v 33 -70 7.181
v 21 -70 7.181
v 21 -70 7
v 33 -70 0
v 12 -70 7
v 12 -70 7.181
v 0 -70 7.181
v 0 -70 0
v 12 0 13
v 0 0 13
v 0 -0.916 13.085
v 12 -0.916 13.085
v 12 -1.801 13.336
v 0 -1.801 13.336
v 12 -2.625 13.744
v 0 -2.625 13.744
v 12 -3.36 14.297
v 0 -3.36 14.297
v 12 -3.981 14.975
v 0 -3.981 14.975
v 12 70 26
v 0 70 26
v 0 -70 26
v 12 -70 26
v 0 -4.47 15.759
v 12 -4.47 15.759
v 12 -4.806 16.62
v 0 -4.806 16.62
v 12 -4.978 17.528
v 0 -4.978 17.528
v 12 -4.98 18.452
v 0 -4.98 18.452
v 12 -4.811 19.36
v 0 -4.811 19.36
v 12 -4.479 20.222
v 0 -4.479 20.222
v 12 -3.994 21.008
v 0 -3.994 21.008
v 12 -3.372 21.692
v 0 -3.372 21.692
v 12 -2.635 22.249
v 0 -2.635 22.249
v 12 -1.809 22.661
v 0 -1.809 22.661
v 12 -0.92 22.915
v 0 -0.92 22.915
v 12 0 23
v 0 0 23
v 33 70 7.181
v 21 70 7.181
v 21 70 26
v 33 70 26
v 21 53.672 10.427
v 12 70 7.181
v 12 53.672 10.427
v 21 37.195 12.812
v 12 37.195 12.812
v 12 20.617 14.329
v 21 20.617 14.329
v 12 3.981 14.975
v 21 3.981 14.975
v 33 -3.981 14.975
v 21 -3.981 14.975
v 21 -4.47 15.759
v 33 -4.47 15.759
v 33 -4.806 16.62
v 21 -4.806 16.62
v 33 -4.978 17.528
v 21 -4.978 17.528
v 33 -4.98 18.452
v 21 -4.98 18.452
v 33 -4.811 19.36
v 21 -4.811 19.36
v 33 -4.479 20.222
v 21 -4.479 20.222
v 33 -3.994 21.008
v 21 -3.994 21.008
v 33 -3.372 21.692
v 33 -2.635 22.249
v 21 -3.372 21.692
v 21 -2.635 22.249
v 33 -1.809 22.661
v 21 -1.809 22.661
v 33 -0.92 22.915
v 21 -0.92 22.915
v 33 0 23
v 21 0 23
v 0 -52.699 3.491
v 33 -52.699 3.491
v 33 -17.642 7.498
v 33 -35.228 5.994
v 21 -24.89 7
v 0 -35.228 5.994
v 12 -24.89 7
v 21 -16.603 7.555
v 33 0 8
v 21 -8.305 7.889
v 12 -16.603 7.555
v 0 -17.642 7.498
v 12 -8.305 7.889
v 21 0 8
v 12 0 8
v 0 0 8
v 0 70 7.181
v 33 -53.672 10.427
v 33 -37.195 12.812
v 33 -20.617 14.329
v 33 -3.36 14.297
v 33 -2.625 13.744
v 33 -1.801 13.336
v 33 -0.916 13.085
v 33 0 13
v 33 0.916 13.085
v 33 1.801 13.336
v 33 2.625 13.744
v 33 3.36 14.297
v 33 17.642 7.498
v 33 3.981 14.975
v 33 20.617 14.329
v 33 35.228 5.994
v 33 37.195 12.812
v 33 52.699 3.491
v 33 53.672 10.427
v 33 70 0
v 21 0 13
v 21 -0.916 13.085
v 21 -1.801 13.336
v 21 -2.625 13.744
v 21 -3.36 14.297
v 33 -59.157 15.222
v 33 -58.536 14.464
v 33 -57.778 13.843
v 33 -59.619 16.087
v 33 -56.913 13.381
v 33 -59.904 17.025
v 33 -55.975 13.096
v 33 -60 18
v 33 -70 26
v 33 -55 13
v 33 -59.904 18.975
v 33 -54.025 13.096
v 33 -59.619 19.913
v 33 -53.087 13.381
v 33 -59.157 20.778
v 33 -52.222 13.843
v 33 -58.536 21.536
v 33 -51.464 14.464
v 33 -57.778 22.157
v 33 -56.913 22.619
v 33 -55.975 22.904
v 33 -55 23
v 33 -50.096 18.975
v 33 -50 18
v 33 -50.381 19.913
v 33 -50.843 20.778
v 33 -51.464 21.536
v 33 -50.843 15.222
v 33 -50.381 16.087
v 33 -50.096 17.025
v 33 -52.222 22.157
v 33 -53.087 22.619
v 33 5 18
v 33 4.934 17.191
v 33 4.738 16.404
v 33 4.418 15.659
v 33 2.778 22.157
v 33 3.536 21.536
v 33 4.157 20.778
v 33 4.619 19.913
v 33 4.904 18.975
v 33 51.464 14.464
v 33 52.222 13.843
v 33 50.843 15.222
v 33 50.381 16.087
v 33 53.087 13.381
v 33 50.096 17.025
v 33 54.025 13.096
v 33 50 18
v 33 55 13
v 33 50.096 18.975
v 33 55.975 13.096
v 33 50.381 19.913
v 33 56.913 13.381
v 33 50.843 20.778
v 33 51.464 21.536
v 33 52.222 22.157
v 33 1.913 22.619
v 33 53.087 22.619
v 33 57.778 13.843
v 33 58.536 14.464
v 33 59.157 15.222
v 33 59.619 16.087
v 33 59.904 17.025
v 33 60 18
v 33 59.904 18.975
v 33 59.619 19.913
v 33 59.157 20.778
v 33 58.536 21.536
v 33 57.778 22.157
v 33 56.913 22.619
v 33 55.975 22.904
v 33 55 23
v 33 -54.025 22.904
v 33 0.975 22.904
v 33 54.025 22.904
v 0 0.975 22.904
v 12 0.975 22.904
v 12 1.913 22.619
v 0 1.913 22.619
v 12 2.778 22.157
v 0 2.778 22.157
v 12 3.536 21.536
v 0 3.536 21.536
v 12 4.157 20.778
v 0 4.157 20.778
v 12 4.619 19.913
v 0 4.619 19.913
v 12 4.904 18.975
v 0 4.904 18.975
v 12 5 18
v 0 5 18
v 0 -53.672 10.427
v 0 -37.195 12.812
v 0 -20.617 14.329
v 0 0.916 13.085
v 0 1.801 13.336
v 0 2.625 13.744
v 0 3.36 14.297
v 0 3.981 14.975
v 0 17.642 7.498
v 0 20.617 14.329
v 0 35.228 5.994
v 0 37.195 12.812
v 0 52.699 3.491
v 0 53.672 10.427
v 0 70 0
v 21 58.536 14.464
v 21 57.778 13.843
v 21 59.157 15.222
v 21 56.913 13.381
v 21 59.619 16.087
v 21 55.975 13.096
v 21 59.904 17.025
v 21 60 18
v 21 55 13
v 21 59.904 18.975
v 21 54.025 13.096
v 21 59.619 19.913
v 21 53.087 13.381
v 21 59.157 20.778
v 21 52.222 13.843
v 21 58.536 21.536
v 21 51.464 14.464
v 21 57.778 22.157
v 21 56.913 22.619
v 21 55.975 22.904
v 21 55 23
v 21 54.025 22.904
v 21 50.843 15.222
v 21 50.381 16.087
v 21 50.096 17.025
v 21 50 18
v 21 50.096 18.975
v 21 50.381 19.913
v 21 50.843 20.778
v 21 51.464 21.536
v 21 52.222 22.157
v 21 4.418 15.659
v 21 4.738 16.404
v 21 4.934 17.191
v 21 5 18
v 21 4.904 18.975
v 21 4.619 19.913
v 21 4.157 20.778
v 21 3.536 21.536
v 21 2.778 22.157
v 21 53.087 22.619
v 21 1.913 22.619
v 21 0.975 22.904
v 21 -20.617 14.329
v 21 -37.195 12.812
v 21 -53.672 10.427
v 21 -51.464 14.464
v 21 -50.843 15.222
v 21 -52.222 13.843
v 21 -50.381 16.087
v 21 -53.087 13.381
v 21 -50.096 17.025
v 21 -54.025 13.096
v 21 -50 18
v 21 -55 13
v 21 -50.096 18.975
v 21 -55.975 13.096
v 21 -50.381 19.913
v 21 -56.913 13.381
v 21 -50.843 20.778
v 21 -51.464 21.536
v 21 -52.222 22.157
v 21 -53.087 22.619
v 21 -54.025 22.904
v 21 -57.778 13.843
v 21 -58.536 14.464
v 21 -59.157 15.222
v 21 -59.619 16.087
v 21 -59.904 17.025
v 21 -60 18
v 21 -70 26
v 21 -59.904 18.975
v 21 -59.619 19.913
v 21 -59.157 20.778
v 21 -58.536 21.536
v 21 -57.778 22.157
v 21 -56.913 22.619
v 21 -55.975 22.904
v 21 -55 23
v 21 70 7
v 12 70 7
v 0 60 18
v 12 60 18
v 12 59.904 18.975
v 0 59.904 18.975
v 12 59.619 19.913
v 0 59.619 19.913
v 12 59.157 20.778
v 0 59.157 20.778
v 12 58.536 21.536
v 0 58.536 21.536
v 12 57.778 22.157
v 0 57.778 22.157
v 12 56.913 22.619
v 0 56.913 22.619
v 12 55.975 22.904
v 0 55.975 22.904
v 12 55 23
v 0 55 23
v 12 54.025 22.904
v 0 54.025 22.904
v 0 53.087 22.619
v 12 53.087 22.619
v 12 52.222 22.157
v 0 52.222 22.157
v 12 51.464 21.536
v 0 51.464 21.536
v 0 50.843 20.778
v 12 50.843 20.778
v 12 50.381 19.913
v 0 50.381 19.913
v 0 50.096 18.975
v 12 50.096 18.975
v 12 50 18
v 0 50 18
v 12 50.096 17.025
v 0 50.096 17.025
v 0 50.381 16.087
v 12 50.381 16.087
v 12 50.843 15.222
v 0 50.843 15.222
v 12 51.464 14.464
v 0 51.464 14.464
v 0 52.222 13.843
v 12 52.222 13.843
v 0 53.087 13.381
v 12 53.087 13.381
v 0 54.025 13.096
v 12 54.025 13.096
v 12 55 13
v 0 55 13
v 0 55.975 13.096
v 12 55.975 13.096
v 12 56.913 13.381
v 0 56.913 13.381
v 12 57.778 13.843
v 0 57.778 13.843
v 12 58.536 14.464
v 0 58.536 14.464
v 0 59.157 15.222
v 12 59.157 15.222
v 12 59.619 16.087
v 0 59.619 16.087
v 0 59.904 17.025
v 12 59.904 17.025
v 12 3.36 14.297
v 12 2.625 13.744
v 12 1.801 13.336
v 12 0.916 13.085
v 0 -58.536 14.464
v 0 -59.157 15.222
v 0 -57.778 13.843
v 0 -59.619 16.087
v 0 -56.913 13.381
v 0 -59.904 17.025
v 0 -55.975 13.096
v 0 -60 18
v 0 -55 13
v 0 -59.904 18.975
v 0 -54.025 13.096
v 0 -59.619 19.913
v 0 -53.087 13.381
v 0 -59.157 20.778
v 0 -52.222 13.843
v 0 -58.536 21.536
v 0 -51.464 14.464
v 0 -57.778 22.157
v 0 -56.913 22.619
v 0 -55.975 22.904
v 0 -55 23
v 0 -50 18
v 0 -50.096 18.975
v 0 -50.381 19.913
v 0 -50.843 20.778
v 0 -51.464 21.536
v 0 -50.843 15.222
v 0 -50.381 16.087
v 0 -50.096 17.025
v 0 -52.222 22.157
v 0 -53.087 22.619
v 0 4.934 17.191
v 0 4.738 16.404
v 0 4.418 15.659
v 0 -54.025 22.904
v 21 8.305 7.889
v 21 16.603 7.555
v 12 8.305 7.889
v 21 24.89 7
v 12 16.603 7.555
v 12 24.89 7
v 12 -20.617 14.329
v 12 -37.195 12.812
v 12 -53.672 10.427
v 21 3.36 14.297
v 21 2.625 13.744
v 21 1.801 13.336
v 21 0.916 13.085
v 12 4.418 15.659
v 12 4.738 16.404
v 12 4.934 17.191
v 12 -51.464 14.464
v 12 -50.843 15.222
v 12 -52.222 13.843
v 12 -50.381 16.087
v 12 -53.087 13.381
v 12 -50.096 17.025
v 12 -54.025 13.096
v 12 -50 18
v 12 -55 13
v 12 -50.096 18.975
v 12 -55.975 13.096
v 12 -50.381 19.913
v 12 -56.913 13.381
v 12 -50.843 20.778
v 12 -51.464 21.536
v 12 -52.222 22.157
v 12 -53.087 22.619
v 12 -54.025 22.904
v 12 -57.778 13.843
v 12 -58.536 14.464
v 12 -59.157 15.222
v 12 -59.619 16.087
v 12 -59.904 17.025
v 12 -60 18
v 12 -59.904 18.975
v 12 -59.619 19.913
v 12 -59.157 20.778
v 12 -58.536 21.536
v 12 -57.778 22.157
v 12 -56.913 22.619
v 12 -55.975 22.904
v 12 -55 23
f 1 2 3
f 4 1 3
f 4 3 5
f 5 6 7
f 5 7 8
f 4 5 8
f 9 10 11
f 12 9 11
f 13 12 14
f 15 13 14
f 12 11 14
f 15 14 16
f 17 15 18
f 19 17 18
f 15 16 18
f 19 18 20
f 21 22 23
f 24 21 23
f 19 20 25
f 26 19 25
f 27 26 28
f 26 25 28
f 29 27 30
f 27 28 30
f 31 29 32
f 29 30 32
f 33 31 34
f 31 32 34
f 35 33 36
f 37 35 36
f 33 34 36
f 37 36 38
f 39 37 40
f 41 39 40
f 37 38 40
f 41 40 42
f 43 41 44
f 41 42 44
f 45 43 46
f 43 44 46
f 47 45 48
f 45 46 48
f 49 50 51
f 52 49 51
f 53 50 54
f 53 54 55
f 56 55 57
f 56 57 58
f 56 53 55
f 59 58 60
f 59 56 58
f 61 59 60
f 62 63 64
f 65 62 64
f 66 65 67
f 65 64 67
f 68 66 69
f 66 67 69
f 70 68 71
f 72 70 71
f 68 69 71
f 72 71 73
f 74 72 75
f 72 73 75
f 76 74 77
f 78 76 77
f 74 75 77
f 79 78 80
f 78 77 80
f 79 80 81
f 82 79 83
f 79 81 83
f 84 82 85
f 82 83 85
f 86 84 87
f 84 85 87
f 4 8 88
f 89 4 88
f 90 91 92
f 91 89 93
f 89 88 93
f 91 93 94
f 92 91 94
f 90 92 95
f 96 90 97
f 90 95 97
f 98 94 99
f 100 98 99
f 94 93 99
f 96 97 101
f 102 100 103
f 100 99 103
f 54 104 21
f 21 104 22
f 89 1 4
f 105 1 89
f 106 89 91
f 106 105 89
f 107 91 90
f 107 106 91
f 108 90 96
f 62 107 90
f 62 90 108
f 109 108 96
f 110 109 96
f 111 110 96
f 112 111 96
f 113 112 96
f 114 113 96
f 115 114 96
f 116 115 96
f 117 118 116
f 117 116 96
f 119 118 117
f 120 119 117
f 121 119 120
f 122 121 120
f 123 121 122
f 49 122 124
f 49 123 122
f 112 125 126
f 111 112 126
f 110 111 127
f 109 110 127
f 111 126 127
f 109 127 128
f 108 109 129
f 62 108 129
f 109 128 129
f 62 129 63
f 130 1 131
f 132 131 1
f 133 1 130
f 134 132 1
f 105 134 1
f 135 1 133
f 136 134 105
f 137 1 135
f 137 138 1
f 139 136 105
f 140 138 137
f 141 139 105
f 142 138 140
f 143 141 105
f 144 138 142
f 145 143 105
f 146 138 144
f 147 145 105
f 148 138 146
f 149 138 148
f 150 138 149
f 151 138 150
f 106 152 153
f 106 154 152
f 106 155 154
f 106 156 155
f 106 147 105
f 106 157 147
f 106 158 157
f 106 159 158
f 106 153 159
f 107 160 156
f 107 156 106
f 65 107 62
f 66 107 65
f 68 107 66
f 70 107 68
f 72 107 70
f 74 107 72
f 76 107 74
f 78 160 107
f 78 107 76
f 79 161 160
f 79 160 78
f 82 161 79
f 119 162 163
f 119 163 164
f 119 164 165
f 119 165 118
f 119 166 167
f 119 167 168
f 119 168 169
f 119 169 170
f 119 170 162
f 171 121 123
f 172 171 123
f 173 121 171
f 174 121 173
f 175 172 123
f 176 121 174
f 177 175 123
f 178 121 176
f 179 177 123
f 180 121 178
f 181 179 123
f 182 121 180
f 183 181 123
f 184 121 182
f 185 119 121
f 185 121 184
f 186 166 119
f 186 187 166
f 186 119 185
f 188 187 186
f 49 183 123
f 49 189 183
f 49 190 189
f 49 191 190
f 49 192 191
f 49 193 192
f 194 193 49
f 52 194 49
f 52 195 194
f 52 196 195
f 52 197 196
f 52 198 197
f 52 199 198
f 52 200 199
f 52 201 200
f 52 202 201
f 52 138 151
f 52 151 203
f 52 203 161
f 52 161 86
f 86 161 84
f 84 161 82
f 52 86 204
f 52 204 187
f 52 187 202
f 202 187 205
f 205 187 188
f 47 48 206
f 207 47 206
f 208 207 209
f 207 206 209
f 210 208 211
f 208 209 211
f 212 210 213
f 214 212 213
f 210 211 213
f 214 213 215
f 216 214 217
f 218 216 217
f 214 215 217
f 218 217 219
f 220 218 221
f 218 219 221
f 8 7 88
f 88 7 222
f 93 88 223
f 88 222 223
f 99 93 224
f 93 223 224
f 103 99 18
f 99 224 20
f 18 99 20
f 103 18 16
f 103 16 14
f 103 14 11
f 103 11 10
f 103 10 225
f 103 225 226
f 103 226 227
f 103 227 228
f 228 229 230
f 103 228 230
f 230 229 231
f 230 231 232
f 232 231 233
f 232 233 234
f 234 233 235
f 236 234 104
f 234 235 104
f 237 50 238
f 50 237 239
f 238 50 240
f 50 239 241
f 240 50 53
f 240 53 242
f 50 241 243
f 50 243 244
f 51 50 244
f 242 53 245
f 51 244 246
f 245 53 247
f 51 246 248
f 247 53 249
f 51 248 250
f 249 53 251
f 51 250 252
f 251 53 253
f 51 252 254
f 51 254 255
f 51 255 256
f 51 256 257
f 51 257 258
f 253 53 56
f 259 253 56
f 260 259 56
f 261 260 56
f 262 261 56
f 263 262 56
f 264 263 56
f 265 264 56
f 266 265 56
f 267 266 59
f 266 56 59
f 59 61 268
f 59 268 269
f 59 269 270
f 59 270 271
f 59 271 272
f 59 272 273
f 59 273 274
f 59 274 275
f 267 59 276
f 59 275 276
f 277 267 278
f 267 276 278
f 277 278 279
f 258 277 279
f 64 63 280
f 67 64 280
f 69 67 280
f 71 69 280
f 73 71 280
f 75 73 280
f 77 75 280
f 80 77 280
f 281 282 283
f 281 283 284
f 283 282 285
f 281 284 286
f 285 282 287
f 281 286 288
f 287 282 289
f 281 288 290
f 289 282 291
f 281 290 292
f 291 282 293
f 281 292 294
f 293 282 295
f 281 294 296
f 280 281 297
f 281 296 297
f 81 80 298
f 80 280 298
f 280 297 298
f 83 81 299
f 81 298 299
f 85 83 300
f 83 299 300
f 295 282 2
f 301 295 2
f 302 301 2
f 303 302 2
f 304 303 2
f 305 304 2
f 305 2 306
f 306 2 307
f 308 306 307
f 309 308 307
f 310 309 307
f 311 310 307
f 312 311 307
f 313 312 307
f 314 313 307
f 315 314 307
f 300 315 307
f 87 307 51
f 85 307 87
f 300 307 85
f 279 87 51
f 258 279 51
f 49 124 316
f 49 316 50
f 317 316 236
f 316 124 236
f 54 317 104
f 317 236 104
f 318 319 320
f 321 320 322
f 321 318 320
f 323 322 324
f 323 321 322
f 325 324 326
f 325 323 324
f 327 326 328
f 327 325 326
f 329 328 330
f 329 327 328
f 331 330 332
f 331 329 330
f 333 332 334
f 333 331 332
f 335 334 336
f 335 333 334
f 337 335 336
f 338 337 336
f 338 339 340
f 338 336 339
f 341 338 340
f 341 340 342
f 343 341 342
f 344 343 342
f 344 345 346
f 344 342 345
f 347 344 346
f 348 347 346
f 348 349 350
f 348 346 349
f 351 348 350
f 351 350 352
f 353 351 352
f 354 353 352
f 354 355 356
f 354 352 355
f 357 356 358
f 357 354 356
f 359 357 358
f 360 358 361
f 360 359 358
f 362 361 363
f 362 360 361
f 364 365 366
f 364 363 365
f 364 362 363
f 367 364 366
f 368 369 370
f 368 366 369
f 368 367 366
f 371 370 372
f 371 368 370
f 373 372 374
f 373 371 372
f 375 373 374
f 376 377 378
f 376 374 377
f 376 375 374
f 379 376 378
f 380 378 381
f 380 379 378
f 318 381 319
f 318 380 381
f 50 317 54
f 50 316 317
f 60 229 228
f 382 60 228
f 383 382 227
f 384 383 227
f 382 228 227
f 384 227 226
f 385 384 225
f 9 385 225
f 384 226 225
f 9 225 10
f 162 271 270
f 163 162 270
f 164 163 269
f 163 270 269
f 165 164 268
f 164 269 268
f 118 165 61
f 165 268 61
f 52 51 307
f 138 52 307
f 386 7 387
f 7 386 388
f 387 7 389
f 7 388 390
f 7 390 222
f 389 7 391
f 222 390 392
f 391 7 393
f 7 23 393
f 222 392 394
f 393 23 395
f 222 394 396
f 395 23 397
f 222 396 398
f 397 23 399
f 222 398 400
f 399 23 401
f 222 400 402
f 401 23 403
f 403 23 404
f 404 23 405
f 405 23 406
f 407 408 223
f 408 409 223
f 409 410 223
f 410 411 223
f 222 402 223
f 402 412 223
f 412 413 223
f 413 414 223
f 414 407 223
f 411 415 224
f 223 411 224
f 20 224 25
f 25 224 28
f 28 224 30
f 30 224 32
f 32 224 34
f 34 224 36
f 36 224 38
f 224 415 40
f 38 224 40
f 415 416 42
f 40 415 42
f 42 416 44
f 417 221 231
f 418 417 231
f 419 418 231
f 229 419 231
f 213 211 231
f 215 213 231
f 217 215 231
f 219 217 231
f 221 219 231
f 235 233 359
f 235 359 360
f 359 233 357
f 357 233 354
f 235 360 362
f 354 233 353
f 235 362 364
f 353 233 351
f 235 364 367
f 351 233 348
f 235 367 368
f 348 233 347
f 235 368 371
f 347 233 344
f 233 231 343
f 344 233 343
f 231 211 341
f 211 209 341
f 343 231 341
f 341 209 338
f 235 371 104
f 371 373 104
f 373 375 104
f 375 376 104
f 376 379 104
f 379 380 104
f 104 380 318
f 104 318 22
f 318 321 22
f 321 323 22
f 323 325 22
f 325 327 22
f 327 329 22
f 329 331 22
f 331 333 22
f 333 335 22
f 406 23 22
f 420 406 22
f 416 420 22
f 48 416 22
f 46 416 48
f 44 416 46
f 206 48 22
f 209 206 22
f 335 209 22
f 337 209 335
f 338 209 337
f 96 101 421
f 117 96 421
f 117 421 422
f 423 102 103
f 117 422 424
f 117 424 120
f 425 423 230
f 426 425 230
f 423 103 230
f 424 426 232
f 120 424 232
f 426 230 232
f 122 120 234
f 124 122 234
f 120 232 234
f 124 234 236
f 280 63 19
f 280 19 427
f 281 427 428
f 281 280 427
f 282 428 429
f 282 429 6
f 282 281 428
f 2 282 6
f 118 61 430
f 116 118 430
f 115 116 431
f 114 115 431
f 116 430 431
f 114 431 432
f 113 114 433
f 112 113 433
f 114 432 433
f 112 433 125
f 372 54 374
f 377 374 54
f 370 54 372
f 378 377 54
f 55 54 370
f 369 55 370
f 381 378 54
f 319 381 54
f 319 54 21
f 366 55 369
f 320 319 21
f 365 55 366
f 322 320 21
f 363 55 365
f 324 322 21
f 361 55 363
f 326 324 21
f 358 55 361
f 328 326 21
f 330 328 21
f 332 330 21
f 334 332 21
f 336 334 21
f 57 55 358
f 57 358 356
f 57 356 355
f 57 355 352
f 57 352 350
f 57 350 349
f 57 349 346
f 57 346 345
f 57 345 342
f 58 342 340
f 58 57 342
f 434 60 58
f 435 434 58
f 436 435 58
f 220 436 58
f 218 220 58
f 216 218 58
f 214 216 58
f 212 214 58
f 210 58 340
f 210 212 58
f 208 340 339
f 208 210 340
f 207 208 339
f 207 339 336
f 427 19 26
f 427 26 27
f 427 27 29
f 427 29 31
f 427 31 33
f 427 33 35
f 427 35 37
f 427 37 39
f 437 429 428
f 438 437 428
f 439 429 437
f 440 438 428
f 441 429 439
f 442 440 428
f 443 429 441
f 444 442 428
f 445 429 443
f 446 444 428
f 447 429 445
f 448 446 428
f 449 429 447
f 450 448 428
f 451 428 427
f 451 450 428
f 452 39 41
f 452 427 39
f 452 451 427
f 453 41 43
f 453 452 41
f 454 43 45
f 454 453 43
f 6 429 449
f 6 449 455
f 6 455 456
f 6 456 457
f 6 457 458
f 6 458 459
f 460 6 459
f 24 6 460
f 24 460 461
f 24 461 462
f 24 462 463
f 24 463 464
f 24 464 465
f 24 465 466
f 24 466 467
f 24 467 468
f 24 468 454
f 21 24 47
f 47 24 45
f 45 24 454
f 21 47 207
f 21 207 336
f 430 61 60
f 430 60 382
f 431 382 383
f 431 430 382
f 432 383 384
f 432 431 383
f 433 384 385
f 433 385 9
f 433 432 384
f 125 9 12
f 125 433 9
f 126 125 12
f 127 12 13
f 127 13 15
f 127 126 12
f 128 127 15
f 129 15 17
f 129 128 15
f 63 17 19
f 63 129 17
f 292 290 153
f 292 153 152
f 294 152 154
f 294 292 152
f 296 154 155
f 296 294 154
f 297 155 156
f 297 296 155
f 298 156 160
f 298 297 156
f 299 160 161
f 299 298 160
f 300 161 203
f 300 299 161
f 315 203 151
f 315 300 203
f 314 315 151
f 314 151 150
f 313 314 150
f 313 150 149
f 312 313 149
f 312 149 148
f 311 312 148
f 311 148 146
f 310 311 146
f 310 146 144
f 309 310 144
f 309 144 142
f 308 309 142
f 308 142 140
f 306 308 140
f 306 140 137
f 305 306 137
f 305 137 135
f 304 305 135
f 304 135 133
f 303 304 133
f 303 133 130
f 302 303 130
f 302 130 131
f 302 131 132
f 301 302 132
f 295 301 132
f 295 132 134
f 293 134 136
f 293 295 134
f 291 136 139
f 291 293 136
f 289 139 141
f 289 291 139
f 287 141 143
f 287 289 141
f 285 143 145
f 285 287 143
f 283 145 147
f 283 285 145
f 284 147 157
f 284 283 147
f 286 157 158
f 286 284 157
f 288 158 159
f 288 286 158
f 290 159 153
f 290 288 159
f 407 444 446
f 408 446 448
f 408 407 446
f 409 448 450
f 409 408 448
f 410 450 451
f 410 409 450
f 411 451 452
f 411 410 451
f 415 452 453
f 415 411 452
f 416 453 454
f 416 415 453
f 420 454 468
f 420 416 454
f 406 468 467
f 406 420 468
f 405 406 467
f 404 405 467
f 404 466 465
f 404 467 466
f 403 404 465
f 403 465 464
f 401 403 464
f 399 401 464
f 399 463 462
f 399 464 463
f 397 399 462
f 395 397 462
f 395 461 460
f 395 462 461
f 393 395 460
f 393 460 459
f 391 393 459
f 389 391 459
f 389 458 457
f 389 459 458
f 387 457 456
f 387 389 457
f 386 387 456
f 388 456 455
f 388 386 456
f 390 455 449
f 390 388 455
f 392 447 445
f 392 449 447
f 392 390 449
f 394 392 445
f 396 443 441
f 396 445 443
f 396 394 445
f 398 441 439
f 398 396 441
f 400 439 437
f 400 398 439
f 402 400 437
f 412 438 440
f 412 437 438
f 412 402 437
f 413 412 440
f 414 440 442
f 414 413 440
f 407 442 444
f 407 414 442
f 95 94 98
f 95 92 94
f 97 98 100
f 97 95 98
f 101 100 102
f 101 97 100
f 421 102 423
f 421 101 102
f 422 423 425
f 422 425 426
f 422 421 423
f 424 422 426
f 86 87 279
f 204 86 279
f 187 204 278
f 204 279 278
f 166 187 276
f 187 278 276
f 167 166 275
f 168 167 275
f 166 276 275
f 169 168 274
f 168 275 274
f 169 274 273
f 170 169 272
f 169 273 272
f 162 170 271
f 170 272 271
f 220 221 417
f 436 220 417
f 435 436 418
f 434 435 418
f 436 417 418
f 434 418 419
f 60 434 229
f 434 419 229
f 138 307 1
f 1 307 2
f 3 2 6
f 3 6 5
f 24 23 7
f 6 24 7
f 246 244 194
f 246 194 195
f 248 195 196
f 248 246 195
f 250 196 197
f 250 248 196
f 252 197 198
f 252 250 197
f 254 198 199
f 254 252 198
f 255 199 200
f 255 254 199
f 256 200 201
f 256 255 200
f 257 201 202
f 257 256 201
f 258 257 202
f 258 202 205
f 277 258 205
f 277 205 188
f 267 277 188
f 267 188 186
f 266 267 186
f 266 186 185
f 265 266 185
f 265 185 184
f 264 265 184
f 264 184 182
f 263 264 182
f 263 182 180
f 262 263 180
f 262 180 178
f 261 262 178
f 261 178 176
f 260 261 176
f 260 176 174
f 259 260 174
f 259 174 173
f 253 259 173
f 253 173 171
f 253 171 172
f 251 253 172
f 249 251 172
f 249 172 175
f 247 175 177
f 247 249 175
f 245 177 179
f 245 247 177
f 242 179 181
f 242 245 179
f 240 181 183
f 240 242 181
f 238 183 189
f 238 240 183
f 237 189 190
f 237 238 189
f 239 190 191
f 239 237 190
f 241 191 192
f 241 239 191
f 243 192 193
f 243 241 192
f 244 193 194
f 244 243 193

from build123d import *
from build123d import SkipClean  # not in build123d's __all__

# Parameters (mm, degrees)
F0_R     = 5
F1_DEPTH = 33
F2_W     = 9
F2_H     = 19
F3_DEPTH = 140
F5_DEPTH = 33


with BuildPart() as f1:
    # F0 (on Right) → F1 (new body)
    with BuildSketch(Plane.YZ):
        with BuildLine():
            ThreePointArc((0, 8), (35.2278299076, 5.9935116916), (70, 0))
            Line((70, 0), (70, 7.1810302798))
            ThreePointArc((70, 7.1810302798), (37.1952808389, 12.8120154562), (3.9811421818, 14.975019516))
            ThreePointArc((3.9811421818, 14.975019516), (2.2220595829, 13.5208872296), (0, 13))
            Line((0, 13), (0, 8))
        make_face()
        with BuildLine():
            ThreePointArc((3.9811421818, 14.975019516), (37.1952808389, 12.8120154562), (70, 7.1810302798))
            Line((70, 7.1810302798), (70, 26))
            Line((70, 26), (0, 26))
            Line((0, 26), (0, 23))
            ThreePointArc((0, 23), (3.5355339059, 21.5355339059), (5, 18))
            ThreePointArc((5, 18), (4.7384444129, 16.4040223856), (3.9811421818, 14.975019516))
        make_face()
        with Locations((55, 18)):
            Circle(F0_R, mode=Mode.SUBTRACT)
        with BuildLine():
            Line((-70, 26), (-70, 7.1810302798))
            ThreePointArc((-70, 7.1810302798), (-37.1952808389, 12.8120154562), (-3.9811421818, 14.975019516))
            ThreePointArc((-3.9811421818, 14.975019516), (-4.4791127704, 20.2220595829), (0, 23))
            Line((0, 23), (0, 26))
            Line((0, 26), (-70, 26))
        make_face()
        with Locations((-55, 18)):
            Circle(F0_R, mode=Mode.SUBTRACT)
        with BuildLine():
            Line((-70, 7.1810302798), (-70, 0))
            ThreePointArc((-70, 0), (-35.2278299076, 5.9935116916), (0, 8))
            Line((0, 8), (0, 13))
            ThreePointArc((0, 13), (-2.2220595829, 13.5208872296), (-3.9811421818, 14.975019516))
            ThreePointArc((-3.9811421818, 14.975019516), (-37.1952808389, 12.8120154562), (-70, 7.1810302798))
        make_face()
    extrude(amount=F1_DEPTH)

    # F2 (on face) → F3 (cut)
    with BuildSketch(Plane.XZ.offset(70)):
        with Locations((16.5, 16.5)):
            Rectangle(F2_W, F2_H)
    extrude(amount=-F3_DEPTH, mode=Mode.SUBTRACT)

    # F4 (on face) → F5 (join)
    with BuildSketch(Plane.YZ.offset(33)):
        with BuildLine():
            Line((70, 0), (70, 7.1810302798))
            ThreePointArc((70, 7.1810302798), (37.1952808389, 12.8120154562), (3.9811421818, 14.975019516))
            ThreePointArc((3.9811421818, 14.975019516), (0, 13), (-3.9811421818, 14.975019516))
            ThreePointArc((-3.9811421818, 14.975019516), (-37.1952808389, 12.8120154562), (-70, 7.1810302798))
            Line((-70, 7.1810302798), (-70, 0))
            ThreePointArc((-70, 0), (0, 8), (70, 0))
        make_face()
    with SkipClean():  # cleaning this boolean's faces spoils the solid; the shape is the same uncleaned
        extrude(amount=-F5_DEPTH)


solid = f1.part
